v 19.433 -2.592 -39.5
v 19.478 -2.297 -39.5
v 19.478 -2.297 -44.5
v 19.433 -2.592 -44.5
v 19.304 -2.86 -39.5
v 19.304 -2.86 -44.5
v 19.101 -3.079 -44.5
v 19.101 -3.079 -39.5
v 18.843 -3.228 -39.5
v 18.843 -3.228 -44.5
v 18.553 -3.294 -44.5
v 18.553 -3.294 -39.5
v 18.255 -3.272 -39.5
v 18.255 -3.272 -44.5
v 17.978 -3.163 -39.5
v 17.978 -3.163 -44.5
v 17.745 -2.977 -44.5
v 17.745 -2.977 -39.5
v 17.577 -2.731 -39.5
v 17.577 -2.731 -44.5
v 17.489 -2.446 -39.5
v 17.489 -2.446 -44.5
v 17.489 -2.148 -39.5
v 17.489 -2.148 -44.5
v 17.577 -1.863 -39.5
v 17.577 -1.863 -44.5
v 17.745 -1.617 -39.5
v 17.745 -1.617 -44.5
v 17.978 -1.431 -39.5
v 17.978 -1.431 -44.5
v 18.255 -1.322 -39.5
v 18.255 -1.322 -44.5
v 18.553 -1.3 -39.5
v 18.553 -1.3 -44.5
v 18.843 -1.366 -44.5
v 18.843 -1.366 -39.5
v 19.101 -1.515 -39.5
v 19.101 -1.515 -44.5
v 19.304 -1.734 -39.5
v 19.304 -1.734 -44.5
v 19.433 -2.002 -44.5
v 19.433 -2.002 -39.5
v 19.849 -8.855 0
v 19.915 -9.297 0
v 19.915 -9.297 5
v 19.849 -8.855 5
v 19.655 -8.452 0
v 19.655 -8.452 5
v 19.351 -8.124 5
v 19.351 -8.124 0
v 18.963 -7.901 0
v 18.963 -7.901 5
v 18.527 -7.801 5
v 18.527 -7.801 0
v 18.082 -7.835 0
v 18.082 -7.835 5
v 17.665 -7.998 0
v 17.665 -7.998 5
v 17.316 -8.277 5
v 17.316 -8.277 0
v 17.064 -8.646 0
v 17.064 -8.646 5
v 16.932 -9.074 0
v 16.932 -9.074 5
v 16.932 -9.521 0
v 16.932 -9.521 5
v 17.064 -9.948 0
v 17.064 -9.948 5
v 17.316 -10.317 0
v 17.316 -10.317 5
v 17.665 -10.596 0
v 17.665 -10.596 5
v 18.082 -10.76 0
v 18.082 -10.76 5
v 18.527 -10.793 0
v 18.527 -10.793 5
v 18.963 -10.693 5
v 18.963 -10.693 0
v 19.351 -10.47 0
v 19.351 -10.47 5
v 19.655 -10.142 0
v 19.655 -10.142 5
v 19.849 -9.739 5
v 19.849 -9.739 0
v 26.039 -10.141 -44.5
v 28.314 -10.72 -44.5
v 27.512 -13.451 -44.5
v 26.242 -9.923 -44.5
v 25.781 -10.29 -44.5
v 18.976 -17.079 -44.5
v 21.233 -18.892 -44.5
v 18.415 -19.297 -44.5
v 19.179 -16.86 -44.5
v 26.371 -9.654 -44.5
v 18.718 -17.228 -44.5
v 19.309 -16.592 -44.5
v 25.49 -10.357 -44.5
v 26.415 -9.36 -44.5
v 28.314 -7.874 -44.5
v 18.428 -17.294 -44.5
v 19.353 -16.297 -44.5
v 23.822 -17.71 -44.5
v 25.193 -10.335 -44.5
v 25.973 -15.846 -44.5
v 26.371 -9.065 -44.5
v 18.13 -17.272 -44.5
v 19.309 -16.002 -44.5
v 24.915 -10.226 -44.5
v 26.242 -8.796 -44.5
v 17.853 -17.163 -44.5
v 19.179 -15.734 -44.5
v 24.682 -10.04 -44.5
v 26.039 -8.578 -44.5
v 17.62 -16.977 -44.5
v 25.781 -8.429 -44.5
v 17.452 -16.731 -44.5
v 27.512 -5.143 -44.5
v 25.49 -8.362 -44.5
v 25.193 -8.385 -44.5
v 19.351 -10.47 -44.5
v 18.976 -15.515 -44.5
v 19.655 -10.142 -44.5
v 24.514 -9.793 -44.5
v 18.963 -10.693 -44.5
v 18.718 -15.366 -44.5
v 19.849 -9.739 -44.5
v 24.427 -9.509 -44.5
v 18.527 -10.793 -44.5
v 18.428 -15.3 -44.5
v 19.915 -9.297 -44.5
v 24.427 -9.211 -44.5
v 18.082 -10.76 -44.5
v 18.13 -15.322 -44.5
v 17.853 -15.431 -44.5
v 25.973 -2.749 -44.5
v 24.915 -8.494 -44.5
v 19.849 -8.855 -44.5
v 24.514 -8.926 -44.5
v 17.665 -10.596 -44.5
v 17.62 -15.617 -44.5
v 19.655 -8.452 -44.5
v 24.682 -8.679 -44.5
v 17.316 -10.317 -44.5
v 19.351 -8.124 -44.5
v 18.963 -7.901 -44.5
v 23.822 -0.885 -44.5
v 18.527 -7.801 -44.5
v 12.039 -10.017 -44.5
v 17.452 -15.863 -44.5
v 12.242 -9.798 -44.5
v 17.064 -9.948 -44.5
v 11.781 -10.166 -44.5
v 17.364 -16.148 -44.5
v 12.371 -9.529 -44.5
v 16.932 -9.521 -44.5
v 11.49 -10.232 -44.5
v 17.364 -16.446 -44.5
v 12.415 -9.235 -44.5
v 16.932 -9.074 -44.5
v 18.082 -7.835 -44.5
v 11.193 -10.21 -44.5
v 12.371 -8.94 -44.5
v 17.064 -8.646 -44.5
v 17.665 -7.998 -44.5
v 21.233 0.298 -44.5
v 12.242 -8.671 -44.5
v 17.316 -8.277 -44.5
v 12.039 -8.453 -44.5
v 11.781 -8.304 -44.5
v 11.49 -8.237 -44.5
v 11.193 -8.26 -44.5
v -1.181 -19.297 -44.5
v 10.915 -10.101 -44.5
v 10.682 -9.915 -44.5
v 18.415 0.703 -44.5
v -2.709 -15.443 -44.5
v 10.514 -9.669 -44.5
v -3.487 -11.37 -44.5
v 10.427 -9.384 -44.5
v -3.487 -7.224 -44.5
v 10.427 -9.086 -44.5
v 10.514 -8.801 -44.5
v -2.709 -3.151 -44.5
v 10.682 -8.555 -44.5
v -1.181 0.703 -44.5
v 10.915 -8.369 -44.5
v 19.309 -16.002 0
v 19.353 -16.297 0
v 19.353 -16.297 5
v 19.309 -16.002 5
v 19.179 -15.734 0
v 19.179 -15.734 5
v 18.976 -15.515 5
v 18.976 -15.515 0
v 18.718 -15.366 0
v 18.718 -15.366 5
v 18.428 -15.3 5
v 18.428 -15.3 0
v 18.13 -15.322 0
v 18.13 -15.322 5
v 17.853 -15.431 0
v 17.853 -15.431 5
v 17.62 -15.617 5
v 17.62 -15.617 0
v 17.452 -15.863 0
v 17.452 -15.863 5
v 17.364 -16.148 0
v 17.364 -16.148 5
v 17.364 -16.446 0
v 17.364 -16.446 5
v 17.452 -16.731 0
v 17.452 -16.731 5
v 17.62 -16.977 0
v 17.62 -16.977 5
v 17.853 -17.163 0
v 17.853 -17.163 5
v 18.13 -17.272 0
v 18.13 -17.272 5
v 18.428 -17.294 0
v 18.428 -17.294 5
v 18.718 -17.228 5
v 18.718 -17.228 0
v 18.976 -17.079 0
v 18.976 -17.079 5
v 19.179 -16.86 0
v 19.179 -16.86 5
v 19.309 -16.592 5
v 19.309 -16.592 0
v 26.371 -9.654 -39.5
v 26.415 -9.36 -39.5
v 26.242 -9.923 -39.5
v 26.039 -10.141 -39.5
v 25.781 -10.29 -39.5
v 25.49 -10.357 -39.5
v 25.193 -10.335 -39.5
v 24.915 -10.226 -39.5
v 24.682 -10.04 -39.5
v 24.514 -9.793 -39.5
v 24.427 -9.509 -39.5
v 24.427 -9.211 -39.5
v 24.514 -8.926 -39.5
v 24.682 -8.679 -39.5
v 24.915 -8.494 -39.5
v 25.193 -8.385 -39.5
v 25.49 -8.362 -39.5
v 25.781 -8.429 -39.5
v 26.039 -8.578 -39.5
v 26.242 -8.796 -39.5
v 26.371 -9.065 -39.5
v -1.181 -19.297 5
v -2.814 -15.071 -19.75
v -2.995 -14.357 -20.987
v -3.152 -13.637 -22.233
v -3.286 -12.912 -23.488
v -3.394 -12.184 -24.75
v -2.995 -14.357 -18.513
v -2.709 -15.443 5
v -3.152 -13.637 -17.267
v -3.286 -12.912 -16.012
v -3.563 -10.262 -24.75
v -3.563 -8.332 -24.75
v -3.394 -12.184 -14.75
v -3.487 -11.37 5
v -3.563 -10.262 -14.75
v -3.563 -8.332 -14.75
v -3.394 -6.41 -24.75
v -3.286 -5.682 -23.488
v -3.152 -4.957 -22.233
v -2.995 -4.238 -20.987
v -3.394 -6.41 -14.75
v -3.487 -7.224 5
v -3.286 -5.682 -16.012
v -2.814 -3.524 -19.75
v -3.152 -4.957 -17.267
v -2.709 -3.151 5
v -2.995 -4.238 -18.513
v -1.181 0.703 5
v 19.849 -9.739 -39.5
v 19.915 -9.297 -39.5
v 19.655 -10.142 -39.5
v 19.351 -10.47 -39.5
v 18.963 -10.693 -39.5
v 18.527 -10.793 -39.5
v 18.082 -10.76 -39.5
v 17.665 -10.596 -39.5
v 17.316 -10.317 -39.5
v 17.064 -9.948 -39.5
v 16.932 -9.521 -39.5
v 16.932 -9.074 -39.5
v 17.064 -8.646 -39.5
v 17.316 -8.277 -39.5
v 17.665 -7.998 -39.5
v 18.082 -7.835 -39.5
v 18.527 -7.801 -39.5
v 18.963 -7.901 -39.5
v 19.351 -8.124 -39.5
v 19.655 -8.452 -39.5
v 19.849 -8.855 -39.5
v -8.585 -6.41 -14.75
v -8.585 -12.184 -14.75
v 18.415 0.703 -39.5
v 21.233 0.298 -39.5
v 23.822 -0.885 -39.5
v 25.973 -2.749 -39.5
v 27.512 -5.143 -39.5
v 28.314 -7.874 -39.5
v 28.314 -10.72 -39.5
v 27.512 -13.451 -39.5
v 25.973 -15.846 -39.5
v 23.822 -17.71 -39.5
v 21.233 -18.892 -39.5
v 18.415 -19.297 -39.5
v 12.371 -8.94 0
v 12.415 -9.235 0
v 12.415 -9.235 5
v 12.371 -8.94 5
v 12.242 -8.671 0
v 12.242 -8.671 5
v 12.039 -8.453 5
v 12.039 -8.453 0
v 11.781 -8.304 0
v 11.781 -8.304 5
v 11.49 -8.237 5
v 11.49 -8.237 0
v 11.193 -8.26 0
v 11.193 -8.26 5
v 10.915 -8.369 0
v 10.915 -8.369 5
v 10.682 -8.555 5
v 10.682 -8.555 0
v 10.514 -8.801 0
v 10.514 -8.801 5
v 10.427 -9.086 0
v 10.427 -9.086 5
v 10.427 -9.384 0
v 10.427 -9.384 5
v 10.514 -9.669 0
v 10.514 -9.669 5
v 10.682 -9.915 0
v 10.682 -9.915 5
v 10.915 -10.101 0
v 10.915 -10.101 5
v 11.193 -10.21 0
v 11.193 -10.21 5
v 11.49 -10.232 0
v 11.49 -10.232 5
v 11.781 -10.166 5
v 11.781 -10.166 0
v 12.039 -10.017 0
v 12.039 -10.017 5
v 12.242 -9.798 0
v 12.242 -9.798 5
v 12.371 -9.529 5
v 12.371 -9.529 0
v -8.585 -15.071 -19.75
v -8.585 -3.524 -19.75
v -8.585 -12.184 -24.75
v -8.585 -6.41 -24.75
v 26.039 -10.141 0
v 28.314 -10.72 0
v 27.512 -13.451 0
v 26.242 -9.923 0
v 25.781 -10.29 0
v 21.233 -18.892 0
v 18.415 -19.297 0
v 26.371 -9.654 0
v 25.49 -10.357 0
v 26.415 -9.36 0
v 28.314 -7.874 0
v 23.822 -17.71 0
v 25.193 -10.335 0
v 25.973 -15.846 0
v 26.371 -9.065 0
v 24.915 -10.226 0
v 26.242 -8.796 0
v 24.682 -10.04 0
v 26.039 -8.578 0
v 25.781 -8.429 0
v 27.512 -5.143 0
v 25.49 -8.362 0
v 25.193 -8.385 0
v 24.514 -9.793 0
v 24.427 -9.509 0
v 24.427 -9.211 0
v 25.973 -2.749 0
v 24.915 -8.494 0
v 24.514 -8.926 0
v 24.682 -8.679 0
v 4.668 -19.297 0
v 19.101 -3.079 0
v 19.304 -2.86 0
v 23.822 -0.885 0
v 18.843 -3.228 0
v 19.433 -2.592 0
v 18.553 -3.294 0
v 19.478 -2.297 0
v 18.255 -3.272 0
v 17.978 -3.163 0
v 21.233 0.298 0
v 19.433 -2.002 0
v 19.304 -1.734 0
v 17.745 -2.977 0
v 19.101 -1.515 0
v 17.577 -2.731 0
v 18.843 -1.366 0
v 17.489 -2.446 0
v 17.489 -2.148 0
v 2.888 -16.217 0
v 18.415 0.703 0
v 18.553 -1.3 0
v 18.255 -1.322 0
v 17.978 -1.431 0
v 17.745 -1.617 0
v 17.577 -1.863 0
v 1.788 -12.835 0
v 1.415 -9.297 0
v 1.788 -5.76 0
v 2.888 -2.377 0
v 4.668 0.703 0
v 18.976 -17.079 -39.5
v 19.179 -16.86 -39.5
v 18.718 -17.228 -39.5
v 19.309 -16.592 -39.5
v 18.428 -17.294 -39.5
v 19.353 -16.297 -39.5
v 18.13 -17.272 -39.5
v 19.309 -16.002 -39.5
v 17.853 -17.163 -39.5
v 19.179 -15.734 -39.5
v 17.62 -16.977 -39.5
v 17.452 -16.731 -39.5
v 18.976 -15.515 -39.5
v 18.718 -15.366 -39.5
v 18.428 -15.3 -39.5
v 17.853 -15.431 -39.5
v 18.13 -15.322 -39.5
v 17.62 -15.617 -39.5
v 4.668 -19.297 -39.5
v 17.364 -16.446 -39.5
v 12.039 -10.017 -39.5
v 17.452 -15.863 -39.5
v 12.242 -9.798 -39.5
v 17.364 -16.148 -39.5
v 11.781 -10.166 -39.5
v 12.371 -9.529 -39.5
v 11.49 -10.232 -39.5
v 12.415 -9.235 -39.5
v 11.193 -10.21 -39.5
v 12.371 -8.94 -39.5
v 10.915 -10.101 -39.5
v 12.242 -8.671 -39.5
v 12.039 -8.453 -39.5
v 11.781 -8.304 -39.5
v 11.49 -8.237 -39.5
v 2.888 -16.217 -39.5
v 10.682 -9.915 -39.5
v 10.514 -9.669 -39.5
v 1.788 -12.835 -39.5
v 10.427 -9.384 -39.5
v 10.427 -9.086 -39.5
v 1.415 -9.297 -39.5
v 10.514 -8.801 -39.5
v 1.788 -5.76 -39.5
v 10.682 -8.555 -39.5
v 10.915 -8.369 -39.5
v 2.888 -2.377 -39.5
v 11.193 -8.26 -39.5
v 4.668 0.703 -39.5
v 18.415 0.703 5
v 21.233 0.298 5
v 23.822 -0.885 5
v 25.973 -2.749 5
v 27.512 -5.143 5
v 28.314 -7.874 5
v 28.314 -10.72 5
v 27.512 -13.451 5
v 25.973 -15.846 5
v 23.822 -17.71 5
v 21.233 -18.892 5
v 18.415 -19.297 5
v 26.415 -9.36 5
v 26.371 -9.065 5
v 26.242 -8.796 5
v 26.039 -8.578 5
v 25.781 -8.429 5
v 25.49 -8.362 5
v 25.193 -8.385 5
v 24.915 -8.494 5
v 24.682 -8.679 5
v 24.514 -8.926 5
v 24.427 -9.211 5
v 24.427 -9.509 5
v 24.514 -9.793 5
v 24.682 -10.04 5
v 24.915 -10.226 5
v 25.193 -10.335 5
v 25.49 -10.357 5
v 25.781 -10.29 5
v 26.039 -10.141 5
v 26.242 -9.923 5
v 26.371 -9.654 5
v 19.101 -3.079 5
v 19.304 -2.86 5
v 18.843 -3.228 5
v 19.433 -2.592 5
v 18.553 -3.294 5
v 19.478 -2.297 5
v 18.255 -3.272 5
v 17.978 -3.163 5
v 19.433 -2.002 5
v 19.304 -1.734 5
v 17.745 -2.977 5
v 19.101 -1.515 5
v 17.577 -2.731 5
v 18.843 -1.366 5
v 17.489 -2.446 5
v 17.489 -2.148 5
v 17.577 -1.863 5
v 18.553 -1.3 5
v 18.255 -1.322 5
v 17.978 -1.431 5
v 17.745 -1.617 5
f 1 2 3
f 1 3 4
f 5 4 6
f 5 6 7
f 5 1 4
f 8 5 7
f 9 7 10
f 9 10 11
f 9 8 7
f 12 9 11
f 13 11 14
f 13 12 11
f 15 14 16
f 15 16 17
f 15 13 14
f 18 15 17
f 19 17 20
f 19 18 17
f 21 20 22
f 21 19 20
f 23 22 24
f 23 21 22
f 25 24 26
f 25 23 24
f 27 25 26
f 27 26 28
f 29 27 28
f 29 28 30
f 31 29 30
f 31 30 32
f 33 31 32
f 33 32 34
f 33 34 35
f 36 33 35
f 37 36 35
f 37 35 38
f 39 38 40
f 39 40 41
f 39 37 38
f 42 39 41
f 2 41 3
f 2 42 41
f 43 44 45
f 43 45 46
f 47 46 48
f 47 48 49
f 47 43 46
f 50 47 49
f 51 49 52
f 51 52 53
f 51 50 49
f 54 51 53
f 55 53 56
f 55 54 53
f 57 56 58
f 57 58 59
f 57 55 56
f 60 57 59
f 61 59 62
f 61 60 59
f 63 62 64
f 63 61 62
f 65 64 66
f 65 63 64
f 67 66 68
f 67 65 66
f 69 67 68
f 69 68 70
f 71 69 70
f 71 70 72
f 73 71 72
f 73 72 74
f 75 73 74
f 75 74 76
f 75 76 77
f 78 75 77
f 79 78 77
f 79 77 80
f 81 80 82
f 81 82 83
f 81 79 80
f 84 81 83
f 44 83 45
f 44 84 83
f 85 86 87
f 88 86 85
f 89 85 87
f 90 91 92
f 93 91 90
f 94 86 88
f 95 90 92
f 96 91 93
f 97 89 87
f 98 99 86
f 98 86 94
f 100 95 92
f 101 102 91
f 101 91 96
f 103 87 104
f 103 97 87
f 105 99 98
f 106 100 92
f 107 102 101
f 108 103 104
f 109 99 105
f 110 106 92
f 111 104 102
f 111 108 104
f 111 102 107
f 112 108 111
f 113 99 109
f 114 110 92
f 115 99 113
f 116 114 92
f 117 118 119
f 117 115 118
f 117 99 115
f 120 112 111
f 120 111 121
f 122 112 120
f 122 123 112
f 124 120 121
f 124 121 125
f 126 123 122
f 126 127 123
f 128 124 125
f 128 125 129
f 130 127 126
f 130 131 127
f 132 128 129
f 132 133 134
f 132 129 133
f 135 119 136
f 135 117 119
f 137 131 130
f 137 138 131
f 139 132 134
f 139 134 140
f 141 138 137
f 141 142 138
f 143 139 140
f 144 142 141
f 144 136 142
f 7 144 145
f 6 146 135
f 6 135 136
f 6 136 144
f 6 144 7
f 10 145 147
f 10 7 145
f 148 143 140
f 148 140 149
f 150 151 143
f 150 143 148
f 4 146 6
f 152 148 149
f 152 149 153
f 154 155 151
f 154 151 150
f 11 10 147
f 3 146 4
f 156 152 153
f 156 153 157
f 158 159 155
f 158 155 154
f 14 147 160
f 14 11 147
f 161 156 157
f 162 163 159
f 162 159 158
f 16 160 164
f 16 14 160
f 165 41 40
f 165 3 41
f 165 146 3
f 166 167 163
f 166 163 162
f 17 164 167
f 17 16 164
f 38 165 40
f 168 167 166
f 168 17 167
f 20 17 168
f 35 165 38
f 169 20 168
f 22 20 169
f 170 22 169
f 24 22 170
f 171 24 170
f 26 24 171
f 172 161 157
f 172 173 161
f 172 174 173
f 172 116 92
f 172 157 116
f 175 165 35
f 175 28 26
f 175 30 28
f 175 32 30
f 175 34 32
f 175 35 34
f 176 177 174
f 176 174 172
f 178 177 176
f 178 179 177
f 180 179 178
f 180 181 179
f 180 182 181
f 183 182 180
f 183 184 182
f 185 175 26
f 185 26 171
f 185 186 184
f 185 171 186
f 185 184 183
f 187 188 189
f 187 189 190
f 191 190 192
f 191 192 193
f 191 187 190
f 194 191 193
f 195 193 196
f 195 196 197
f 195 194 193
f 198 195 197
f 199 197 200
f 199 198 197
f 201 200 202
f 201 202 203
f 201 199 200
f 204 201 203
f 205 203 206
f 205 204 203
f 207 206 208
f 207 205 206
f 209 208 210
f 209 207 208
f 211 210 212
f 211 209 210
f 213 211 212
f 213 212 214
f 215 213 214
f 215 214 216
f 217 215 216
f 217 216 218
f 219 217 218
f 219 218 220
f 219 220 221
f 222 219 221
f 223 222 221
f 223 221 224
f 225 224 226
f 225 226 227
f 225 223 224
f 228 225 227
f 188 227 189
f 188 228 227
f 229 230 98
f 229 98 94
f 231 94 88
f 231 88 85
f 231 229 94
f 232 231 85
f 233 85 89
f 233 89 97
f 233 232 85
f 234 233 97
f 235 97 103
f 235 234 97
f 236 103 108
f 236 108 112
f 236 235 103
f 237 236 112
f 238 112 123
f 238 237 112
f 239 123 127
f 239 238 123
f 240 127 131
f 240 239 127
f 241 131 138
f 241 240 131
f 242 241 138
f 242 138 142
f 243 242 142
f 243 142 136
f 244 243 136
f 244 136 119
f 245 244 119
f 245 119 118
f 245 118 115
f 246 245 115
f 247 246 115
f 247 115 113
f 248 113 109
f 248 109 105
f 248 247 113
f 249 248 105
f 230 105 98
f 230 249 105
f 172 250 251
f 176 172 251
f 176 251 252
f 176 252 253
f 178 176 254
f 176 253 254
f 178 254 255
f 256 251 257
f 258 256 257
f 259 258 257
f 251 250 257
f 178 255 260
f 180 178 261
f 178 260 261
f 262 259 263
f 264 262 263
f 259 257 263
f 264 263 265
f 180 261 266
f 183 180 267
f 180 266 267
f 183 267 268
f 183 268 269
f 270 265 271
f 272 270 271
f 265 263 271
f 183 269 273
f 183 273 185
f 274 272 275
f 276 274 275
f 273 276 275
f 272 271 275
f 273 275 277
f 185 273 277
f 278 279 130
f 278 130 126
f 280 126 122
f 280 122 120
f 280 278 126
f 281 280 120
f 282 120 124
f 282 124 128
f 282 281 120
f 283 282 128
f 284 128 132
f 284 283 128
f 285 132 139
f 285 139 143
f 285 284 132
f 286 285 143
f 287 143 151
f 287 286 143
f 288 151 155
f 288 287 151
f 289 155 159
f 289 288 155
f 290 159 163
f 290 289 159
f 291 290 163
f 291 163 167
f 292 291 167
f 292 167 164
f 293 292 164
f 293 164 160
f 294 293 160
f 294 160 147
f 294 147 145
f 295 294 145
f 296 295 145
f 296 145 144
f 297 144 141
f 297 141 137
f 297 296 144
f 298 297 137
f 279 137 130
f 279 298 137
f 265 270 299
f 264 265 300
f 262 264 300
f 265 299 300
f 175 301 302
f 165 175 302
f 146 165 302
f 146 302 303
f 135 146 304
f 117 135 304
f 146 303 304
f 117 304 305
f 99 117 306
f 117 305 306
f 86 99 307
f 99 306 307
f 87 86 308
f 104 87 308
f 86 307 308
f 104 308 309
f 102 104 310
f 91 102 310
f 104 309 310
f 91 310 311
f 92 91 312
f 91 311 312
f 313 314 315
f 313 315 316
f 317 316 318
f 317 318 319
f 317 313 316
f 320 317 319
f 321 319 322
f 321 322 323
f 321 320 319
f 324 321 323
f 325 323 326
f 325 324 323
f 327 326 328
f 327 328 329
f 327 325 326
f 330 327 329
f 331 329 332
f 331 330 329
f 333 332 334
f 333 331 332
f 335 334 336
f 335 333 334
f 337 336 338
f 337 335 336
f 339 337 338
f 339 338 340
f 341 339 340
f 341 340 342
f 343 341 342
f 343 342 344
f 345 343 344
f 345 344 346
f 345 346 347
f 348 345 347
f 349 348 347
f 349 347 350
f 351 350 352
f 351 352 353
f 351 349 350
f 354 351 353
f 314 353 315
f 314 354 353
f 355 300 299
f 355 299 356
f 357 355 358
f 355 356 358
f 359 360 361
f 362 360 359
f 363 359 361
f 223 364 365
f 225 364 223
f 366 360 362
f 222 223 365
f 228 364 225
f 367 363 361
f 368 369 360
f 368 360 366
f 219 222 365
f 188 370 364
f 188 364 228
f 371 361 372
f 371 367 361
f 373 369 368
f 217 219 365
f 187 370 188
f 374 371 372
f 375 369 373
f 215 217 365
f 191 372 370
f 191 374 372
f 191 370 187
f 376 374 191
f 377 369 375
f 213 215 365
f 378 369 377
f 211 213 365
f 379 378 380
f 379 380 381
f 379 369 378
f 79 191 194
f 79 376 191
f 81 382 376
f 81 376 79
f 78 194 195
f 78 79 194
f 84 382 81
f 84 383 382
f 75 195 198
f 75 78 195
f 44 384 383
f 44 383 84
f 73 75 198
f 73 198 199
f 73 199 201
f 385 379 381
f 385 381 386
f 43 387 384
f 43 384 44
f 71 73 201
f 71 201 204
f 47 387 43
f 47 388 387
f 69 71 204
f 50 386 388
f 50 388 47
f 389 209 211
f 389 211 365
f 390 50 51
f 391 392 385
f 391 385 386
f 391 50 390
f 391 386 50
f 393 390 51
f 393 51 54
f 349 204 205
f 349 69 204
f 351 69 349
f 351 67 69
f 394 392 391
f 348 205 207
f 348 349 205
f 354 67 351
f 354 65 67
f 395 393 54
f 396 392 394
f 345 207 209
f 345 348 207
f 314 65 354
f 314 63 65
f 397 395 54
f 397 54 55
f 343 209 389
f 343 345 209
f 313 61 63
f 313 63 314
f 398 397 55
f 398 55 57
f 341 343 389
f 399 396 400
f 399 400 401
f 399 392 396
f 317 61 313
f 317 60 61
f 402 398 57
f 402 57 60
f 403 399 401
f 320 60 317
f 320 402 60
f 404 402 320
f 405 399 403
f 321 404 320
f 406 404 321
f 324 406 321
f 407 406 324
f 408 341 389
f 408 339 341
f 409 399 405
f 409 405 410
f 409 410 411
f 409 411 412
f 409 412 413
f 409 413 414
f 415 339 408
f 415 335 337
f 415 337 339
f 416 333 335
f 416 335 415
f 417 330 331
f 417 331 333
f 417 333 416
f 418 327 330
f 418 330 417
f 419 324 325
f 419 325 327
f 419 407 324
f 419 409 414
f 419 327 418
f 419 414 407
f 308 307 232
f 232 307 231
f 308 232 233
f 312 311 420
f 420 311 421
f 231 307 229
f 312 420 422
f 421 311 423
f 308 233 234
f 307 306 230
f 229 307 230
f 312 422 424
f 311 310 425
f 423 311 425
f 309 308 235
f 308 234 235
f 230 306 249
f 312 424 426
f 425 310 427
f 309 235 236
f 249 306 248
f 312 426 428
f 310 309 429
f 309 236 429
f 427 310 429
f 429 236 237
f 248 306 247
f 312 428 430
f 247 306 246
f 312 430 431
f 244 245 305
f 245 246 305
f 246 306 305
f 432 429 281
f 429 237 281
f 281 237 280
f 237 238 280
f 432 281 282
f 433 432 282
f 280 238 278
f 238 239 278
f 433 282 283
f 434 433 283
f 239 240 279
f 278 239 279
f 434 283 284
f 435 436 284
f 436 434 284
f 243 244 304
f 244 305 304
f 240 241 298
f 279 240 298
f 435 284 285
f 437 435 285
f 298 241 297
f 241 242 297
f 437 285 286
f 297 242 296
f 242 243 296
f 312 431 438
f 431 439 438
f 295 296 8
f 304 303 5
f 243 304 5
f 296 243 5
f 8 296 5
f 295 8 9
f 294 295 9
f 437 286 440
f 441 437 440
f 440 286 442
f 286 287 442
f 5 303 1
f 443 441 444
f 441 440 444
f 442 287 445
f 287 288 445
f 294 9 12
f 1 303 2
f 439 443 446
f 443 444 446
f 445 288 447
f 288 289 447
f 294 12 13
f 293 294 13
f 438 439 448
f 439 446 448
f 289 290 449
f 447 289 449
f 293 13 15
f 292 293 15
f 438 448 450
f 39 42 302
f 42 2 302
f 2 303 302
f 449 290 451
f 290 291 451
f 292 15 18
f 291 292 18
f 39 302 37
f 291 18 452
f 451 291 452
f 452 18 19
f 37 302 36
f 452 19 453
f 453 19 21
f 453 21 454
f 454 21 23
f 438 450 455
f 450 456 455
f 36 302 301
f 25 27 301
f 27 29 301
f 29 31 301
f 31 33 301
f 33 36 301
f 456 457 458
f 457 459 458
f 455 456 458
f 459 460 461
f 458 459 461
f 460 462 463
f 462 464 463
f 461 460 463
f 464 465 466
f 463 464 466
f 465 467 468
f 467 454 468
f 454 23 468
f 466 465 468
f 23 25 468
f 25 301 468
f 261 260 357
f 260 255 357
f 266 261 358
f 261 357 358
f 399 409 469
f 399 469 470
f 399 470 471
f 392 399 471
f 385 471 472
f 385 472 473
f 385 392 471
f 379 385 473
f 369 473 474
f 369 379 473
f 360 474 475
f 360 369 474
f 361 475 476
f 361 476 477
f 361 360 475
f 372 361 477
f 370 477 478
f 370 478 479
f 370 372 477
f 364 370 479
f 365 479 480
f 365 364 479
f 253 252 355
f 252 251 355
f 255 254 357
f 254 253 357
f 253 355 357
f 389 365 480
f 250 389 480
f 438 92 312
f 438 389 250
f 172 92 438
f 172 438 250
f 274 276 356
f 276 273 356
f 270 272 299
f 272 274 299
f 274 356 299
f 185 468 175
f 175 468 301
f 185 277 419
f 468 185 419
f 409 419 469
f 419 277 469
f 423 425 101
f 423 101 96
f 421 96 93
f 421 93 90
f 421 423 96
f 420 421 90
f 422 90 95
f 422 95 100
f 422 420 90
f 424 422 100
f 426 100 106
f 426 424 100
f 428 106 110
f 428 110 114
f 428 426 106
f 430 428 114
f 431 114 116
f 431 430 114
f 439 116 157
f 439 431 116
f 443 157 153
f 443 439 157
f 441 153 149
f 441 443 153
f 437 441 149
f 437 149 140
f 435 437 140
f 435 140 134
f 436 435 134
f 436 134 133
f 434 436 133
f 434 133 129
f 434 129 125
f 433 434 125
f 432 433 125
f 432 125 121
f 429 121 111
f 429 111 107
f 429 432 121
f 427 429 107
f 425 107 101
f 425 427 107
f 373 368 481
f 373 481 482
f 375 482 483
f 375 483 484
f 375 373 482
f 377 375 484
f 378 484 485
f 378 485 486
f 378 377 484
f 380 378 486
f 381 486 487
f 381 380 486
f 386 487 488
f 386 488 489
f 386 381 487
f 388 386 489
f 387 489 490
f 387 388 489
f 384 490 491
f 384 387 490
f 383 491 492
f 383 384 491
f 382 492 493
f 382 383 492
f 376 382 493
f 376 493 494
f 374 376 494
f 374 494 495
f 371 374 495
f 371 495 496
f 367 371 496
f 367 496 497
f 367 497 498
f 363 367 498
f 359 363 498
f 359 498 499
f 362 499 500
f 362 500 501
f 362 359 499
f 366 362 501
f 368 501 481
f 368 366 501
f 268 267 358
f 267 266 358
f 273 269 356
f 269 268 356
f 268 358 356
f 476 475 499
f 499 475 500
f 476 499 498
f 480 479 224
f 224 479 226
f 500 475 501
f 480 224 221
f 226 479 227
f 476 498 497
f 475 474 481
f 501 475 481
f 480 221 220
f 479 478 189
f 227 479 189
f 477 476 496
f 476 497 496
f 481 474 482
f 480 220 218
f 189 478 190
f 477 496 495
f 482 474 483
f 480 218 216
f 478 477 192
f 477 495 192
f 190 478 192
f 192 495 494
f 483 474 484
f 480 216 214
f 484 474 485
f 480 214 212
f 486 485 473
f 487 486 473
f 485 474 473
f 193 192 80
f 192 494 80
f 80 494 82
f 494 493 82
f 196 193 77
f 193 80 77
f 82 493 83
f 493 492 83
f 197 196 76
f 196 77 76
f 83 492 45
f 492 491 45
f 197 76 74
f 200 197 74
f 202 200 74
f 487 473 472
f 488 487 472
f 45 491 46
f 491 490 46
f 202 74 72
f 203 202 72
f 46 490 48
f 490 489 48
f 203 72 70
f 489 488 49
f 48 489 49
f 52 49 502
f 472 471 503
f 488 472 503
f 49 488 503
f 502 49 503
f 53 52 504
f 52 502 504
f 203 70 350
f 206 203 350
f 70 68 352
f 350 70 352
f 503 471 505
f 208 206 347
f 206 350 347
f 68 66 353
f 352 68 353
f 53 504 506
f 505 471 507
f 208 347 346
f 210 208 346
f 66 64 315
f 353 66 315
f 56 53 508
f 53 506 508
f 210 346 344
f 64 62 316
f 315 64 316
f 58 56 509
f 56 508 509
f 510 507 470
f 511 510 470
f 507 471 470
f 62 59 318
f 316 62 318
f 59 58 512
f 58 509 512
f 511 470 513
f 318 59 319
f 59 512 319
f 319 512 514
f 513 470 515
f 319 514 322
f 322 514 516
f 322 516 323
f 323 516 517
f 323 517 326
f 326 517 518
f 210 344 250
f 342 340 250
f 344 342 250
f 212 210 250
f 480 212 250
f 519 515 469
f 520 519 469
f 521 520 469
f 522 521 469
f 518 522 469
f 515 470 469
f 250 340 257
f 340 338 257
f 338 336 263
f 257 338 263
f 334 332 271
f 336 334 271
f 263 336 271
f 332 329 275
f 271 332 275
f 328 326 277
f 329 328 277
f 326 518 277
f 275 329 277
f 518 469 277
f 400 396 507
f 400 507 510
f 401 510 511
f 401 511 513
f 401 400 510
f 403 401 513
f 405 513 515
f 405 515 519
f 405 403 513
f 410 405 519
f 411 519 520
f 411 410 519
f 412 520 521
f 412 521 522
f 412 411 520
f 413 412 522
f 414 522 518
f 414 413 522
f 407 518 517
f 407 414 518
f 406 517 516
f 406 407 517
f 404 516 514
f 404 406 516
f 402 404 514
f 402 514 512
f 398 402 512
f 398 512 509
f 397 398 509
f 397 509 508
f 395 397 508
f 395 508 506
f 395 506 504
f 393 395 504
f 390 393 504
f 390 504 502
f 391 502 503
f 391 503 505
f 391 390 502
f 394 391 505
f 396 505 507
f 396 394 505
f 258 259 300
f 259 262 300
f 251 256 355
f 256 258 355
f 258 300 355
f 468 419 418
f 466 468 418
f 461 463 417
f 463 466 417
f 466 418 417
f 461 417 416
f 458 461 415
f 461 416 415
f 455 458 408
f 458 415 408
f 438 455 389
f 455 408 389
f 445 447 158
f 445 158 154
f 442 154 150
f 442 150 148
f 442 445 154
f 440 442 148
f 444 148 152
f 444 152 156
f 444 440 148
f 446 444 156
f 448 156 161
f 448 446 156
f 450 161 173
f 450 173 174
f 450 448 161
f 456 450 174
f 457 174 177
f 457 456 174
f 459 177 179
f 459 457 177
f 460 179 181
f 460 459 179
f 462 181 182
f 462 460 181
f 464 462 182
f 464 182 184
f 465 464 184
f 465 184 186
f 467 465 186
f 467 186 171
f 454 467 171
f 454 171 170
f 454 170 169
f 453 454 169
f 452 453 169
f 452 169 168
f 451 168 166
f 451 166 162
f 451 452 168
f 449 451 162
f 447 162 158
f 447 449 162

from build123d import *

# Parameters (mm, degrees)
ESQUISSE1_R             = 1
ESQUISSE1_R_2           = 1.5
BOSS_EXTRU_1_DEPTH      = 5
ENL_V_MAT_EXTRU_1_DEPTH = 5
ESQUISSE3_W             = 20
ESQUISSE3_H             = 34
BOSS_EXTRU_2_DEPTH      = 5
ESQUISSE4_R             = 1.5
ESQUISSE4_W             = 9.798464728
ESQUISSE4_H             = 39.858161606
ENL_V_MAT_EXTRU_2_DEPTH = 5
ESQUISSE5_W             = 2.5
ESQUISSE5_H             = 34
BOSS_EXTRU_3_DEPTH      = 5
ESQUISSE6_R             = 1.6
BOSS_EXTRU_4_DEPTH      = 5
ESQUISSE7_W             = 28.704476199
ESQUISSE7_H             = 52.959758587
ENL_V_MAT_EXTRU_3_DEPTH = 10
ESQUISSE8_R             = 1
ESQUISSE8_R_2           = 1.5
BOSS_EXTRU_5_DEPTH      = 5
BOSS_EXTRU_6_DEPTH      = 49.5
BOSS_EXTRU_7_DEPTH      = 1
BOSS_EXTRU_7_DEPTH_BACK = 5


with BuildPart() as part:
    # Esquisse1 → Boss.-Extru.1 (new body)
    with BuildSketch(Plane.XY):
        with BuildLine():
            Line((-13.584596858, -30.047129187), (-13.584596858, -25.547129187))
            Line((-13.584596858, -25.547129187), (-13.584596858, -25.297129187))
            Line((-13.584596858, -25.297129187), (-13.834596858, -25.297129187))
            Line((-13.834596858, -25.297129187), (-16.334596858, -25.297129187))
            Line((-16.334596858, -25.297129187), (-16.584596858, -25.297129187))
            Line((-16.584596858, -25.297129187), (-16.584596858, -25.047129187))
            Line((-16.584596858, -25.047129187), (-16.584596858, 6.452870813))
            Line((-16.584596858, 6.452870813), (-16.584596858, 6.702870813))
            Line((-16.584596858, 6.702870813), (-16.334596858, 6.702870813))
            Line((-16.334596858, 6.702870813), (-13.834596858, 6.702870813))
            Line((-13.834596858, 6.702870813), (-13.584596858, 6.702870813))
            Line((-13.584596858, 6.702870813), (-13.584596858, 6.952870813))
            Line((-13.584596858, 6.952870813), (-13.584596858, 11.452870813))
            Line((-13.584596858, 11.452870813), (-13.584596858, 11.702870813))
            Line((-13.584596858, 11.702870813), (-13.334596858, 11.702870813))
            Line((-13.334596858, 11.702870813), (-8.584596858, 11.702870813))
            Line((-8.584596858, 11.702870813), (-8.584596858, 6.702870813))
            Line((-8.584596858, 6.702870813), (-7.491776281, 6.702870813))
            Line((-7.491776281, 6.702870813), (-4.034541178, 6.702870813))
            ThreePointArc((-4.034541178, 6.702870813), (-0.161557832, 6.19424756), (3.448773595, 4.702870813))
            ThreePointArc((3.448773595, 4.702870813), (10.66943645, 1.720117321), (18.415403142, 0.702870813))
            ThreePointArc((18.415403142, 0.702870813), (28.415403142, -9.297129187), (18.415403142, -19.297129187))
            ThreePointArc((18.415403142, -19.297129187), (10.66943645, -20.314375694), (3.448773595, -23.297129187))
            ThreePointArc((3.448773595, -23.297129187), (-0.161557832, -24.788505933), (-4.034541178, -25.297129187))
            Line((-4.034541178, -25.297129187), (-7.491776281, -25.297129187))
            Line((-7.491776281, -25.297129187), (-8.584596858, -25.297129187))
            Line((-8.584596858, -25.297129187), (-8.584596858, -30.297129187))
            Line((-8.584596858, -30.297129187), (-13.334596858, -30.297129187))
            Line((-13.334596858, -30.297129187), (-13.584596858, -30.297129187))
            Line((-13.584596858, -30.297129187), (-13.584596858, -30.047129187))
        make_face()
        with Locations((18.477857718, -2.297129187)):
            Circle(ESQUISSE1_R, mode=Mode.SUBTRACT)
        with Locations((25.415403142, -9.359583762)):
            Circle(ESQUISSE1_R, mode=Mode.SUBTRACT)
        with Locations((18.415403142, -9.297129187)):
            Circle(ESQUISSE1_R_2, mode=Mode.SUBTRACT)
        with Locations((11.415403142, -9.234674611)):
            Circle(ESQUISSE1_R, mode=Mode.SUBTRACT)
        with Locations((18.352948567, -16.297129187)):
            Circle(ESQUISSE1_R, mode=Mode.SUBTRACT)
    extrude(amount=BOSS_EXTRU_1_DEPTH)

    # Esquisse2 → Enlèv. mat.-Extru.1 (cut)
    with BuildSketch(Plane(origin=(0, 0, 0), x_dir=(-1, 0, 0), z_dir=(0, 0, -1))):
        Polygon((1.584596858, -19.297129187), (1.584596858, -25.297129187), (1.584596858, -26.297129187), (21.584596858, -26.297129187), (21.584596858, -33.65697819), (-26.833247513, -33.65697819), (-26.198667142, -19.297129187), align=None)
        Polygon((21.584596858, 7.702870813), (1.584596858, 7.702870813), (1.584596858, 6.702870813), (1.584596858, 0.702870813), (-26.198667142, 0.702870813), (-26.833247513, 15.062719816), (21.584596858, 15.062719816), align=None)
    extrude(amount=-ENL_V_MAT_EXTRU_1_DEPTH, mode=Mode.SUBTRACT)

    # Esquisse3 → Boss.-Extru.2 (add)
    with BuildSketch(Plane(origin=(0, 0, 0), x_dir=(-1, 0, 0), z_dir=(0, 0, -1))):
        with Locations((11.584596858, -9.297129187)):
            Rectangle(ESQUISSE3_W, ESQUISSE3_H)
    extrude(amount=-BOSS_EXTRU_2_DEPTH)

    # Esquisse4 → Enlèv. mat.-Extru.2 (cut)
    with BuildSketch(Plane(origin=(0, 0, 0), x_dir=(-1, 0, 0), z_dir=(0, 0, -1))):
        with Locations((9.084596858, -22.797129187)):
            Circle(ESQUISSE4_R)
        with Locations((9.084596858, 4.202870813)):
            Circle(ESQUISSE4_R)
        with Locations((23.983829222, -9.020336398)):
            Rectangle(ESQUISSE4_W, ESQUISSE4_H)
    extrude(amount=-ENL_V_MAT_EXTRU_2_DEPTH, mode=Mode.SUBTRACT)

    # Esquisse5 → Boss.-Extru.3 (add)
    with BuildSketch(Plane(origin=(0, 0, 0), x_dir=(-1, 0, 0), z_dir=(0, 0, -1))):
        with Locations((0.334596858, -9.297129187)):
            Rectangle(ESQUISSE5_W, ESQUISSE5_H)
    extrude(amount=-BOSS_EXTRU_3_DEPTH)

    # Esquisse6 → Boss.-Extru.4 (add)
    # profile 1 of 2: a face of its own
    with BuildSketch(Plane(origin=(0, 0, 0), x_dir=(-1, 0, 0), z_dir=(0, 0, -1))):
        with BuildLine():
            Line((12.324596858, -25.12480516), (5.844596858, -25.12480516))
            Line((5.844596858, -25.12480516), (5.844596858, -28.797129187))
            ThreePointArc((5.844596858, -28.797129187), (9.084596858, -32.037129187), (12.324596858, -28.797129187))
            Line((12.324596858, -28.797129187), (12.324596858, -25.12480516))
        make_face()
        with Locations((9.084596858, -28.797129187)):
            Circle(ESQUISSE6_R, mode=Mode.SUBTRACT)
    # profile 2 of 2: a face of its own
    with BuildSketch(Plane(origin=(0, 0, 0), x_dir=(-1, 0, 0), z_dir=(0, 0, -1))):
        with BuildLine():
            Line((12.324596858, 6.757738308), (5.844596858, 6.757738308))
            Line((5.844596858, 6.757738308), (5.844596858, 10.202870813))
            ThreePointArc((5.844596858, 10.202870813), (9.084596858, 13.442870813), (12.324596858, 10.202870813))
            Line((12.324596858, 10.202870813), (12.324596858, 6.757738308))
        make_face()
        with Locations((9.084596858, 10.202870813)):
            Circle(ESQUISSE6_R, mode=Mode.SUBTRACT)
    extrude(amount=-BOSS_EXTRU_4_DEPTH)

    # Esquisse7 → Enlèv. mat.-Extru.3 (cut)
    with BuildSketch(Plane.XY.offset(5)):
        with Locations((-12.936834958, -9.72769633)):
            Rectangle(ESQUISSE7_W, ESQUISSE7_H)
    extrude(amount=-ENL_V_MAT_EXTRU_3_DEPTH, mode=Mode.SUBTRACT)



with BuildPart() as body_2:
    # Esquisse8 → Boss.-Extru.5 (new body)
    with BuildSketch(Plane(origin=(0, 0, -39.5), x_dir=(-1, 0, 0), z_dir=(0, 0, -1))):
        with BuildLine():
            Line((-18.415403142, -19.297129187), (-1.415403142, -19.297129187))
            Line((-1.415403142, -19.297129187), (-1.415403142, 0.702870813))
            Line((-1.415403142, 0.702870813), (-18.415403142, 0.702870813))
            ThreePointArc((-18.415403142, 0.702870813), (-28.415403142, -9.297129187), (-18.415403142, -19.297129187))
        make_face()
        with Locations(Location((-11.415403142, -9.234674611, 0), (0, 0, 180))):
            Circle(ESQUISSE8_R, mode=Mode.SUBTRACT)
        with Locations(Location((-18.352948567, -16.297129187, 0), (0, 0, 180))):
            Circle(ESQUISSE8_R, mode=Mode.SUBTRACT)
        with Locations(Location((-18.415403142, -9.297129187, 0), (0, 0, 180))):
            Circle(ESQUISSE8_R_2, mode=Mode.SUBTRACT)
        with Locations(Location((-18.477857718, -2.297129187, 0), (0, 0, 180))):
            Circle(ESQUISSE8_R, mode=Mode.SUBTRACT)
        with Locations(Location((-25.415403142, -9.359583762, 0), (0, 0, 180))):
            Circle(ESQUISSE8_R, mode=Mode.SUBTRACT)
    extrude(amount=BOSS_EXTRU_5_DEPTH)


with BuildPart() as part_1:
    add(part.part)

    add(body_2.part)  # Boss.-Extru.6 merges body 2
    # Esquisse9 → Boss.-Extru.6 (add)
    with BuildSketch(Plane.XY.offset(5)):
        with BuildLine():
            Line((4.667676058, -19.297129187), (-1.1805148, -19.297129187))
            ThreePointArc((-1.1805148, -19.297129187), (-3.584596858, -9.297129187), (-1.1805148, 0.702870813))
            Line((-1.1805148, 0.702870813), (4.667676058, 0.702870813))
            ThreePointArc((4.667676058, 0.702870813), (1.415403142, -9.297129187), (4.667676058, -19.297129187))
        make_face()
    extrude(amount=-BOSS_EXTRU_6_DEPTH)

    # Esquisse10 → Boss.-Extru.7 (add, two sides: drawn at the far end of the back side and taken through both)
    with BuildSketch(Plane(origin=(-3.584596858, 0, 0), x_dir=(0, 0, -1), z_dir=(1, 0, 0)).offset(-BOSS_EXTRU_7_DEPTH_BACK)):
        Polygon((24.75, -12.183880533), (24.75, -6.410377841), (19.75, -3.523626495), (14.75, -6.410377841), (14.75, -12.183880533), (19.75, -15.070631878), align=None)
    extrude(amount=BOSS_EXTRU_7_DEPTH + BOSS_EXTRU_7_DEPTH_BACK)


solid = part_1.part
